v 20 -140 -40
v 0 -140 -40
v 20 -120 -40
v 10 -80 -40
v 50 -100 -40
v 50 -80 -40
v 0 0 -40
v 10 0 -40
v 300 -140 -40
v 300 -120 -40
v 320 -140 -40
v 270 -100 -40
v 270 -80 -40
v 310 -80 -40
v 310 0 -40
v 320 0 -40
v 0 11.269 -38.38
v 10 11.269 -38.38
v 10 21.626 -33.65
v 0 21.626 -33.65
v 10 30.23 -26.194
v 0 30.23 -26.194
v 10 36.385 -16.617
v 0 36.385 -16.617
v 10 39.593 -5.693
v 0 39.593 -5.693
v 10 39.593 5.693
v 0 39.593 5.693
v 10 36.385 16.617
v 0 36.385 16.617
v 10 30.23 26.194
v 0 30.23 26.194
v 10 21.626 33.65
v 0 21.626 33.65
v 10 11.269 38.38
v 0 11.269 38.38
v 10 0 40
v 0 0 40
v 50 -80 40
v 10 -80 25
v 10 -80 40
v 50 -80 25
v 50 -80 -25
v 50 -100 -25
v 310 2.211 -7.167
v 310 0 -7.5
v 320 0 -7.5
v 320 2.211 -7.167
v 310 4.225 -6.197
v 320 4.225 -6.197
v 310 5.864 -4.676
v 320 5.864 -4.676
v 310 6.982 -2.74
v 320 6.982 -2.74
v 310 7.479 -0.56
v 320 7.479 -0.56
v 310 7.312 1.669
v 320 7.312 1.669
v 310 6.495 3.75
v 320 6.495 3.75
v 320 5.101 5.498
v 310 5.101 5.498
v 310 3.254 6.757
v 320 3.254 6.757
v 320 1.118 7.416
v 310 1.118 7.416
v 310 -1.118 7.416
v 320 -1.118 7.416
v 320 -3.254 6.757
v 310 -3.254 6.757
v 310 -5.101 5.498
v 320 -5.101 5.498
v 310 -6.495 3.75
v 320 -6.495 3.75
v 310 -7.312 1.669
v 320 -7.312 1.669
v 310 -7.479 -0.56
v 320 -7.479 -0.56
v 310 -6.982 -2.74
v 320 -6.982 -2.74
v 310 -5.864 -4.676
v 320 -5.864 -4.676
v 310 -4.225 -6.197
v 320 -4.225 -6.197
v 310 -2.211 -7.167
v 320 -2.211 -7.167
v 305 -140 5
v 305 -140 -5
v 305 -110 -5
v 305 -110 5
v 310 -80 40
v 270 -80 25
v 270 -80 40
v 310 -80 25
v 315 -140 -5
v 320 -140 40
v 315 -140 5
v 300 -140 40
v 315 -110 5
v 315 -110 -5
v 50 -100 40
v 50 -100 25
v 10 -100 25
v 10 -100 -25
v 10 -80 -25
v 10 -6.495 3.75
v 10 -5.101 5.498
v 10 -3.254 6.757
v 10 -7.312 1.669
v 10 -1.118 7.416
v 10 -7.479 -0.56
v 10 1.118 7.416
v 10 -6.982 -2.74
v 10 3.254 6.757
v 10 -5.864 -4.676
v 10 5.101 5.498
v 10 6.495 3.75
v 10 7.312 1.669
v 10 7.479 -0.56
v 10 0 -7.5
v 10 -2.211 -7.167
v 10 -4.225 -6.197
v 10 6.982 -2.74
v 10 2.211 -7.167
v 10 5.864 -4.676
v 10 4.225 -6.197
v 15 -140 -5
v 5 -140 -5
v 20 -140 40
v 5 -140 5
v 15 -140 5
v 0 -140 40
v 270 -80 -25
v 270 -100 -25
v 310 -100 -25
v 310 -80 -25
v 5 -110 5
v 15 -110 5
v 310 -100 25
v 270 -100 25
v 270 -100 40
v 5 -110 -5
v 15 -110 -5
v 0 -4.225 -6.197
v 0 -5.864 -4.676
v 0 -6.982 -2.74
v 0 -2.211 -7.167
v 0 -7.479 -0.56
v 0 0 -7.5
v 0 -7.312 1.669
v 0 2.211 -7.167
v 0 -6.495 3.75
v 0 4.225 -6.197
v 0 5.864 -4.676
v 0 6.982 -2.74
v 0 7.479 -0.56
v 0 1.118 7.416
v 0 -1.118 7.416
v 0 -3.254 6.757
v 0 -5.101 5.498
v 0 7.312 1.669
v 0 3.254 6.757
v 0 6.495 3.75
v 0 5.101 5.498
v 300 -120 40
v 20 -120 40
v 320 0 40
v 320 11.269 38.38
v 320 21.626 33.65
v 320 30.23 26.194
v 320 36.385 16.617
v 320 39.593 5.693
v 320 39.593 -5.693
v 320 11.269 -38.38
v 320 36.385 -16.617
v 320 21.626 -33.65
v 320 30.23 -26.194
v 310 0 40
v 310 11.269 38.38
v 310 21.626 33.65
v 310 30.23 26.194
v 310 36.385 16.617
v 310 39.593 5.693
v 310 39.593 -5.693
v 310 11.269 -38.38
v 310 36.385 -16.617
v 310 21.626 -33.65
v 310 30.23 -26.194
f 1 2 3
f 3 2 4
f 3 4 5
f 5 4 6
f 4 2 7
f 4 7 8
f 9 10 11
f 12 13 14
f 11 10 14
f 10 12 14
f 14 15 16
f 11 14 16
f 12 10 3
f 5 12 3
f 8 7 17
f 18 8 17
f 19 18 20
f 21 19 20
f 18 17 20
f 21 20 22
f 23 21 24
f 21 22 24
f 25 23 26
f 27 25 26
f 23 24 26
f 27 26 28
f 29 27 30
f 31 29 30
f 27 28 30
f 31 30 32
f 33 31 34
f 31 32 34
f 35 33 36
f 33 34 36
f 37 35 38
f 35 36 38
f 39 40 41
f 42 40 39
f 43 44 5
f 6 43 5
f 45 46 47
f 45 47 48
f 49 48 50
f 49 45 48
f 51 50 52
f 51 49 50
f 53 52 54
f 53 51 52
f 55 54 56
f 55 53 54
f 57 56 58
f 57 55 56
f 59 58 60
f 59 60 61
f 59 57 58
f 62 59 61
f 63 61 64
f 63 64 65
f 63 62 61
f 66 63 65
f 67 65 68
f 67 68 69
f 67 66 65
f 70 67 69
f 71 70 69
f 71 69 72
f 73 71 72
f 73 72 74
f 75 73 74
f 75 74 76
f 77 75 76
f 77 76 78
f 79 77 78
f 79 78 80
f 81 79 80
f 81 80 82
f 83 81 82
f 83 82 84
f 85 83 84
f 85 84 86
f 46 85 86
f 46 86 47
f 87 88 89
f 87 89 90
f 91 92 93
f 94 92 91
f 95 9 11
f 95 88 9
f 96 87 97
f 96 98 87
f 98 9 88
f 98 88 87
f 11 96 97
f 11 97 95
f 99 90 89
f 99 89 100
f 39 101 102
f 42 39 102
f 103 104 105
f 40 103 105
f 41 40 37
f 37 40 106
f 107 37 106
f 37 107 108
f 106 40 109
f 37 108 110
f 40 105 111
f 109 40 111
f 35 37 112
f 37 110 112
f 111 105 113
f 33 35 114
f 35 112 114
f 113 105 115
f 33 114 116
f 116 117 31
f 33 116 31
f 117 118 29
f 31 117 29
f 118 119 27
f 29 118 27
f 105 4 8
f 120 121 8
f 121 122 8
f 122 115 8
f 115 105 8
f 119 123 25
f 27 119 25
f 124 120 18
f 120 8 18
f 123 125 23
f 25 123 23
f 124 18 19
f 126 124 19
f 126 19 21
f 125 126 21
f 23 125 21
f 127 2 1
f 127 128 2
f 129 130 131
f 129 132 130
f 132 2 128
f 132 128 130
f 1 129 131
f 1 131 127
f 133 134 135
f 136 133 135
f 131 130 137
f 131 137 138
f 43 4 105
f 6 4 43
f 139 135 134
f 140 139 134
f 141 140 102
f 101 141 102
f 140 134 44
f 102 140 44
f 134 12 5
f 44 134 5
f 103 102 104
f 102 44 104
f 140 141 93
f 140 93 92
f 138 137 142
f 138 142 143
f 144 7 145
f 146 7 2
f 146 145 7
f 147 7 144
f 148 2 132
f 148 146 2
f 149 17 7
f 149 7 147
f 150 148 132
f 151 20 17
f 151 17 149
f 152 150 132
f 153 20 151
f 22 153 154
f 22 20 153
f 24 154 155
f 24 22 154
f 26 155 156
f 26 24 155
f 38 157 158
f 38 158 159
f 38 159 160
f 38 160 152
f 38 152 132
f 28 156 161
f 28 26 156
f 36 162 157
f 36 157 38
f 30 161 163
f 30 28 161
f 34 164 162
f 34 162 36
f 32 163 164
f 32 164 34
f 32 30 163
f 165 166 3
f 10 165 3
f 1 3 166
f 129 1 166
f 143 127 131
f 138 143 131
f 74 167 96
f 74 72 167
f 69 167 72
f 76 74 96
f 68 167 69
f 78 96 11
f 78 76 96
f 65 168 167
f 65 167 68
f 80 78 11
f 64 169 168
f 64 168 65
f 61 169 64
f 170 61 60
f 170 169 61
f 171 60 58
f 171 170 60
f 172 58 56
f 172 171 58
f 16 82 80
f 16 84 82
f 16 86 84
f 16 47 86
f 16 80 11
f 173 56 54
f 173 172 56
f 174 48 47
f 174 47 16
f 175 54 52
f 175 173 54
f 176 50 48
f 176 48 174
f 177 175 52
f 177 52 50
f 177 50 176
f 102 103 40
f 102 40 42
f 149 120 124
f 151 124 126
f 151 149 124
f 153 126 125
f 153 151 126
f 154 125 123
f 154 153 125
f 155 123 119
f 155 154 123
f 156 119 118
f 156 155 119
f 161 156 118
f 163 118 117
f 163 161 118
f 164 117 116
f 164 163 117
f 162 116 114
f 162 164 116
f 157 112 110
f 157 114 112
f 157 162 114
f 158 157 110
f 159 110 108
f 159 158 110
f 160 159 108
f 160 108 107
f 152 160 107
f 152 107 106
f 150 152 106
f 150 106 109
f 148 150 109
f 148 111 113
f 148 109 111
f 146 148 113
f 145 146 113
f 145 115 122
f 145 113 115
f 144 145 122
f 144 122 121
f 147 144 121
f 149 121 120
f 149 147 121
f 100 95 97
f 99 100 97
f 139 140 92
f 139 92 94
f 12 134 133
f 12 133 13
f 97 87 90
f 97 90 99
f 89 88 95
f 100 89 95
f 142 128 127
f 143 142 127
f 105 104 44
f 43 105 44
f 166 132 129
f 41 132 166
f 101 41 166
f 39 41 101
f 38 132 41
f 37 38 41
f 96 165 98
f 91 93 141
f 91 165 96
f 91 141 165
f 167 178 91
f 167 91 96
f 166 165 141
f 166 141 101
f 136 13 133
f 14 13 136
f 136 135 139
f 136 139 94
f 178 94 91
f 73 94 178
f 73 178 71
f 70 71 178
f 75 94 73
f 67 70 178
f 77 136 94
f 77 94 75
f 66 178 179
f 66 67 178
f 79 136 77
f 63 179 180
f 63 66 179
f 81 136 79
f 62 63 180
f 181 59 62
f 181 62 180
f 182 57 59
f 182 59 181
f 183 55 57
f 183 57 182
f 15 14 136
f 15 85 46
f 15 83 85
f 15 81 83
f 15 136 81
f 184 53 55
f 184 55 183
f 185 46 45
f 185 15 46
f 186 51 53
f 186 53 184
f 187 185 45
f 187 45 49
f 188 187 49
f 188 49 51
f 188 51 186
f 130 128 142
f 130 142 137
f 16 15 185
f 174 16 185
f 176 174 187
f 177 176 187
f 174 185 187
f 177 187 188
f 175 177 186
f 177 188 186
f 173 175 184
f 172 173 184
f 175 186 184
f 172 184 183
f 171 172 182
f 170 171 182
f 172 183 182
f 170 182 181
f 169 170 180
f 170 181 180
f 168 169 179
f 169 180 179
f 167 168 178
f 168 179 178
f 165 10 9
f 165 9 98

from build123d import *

# Parameters (mm, degrees)
SKETCH_2_R             = 7.5
EXTRUDE_1_DEPTH        = 320
SKETCH_3_W             = 300
SKETCH_3_H             = 140
CUT_EXTRUDE_1_DEPTH    = 351.998575496
SKETCH_4_W             = 20
SKETCH_4_H             = 80
EXTRUDE_2_DEPTH        = 20
SKETCH_5_W             = 10
SKETCH_5_H             = 10
CUT_EXTRUDE_1480_DEPTH = 30
SKETCH_7_W             = 40
SKETCH_7_H             = 15
EXTRUDE_1842_DEPTH     = 20


with BuildPart() as part:
    # 草圖2 → 填料-伸長1 (new body)
    with BuildSketch(Plane(origin=(0, 0, 0), x_dir=(0, 0, -1), z_dir=(1, 0, 0))):
        with BuildLine():
            Line((-40, 0), (-40, -120))
            Line((-40, -120), (40, -120))
            Line((40, -120), (40, 0))
            ThreePointArc((40, 0), (0, 40), (-40, 0))
        make_face()
        Circle(SKETCH_2_R, mode=Mode.SUBTRACT)
    extrude(amount=EXTRUDE_1_DEPTH)

    # 草圖3 → 除料-伸長1 (cut, through all)
    with BuildSketch(Plane(origin=(0, 0, -40), x_dir=(-1, 0, 0), z_dir=(0, 0, -1))):
        with Locations((-160, -30)):
            Rectangle(SKETCH_3_W, SKETCH_3_H)
    extrude(amount=-CUT_EXTRUDE_1_DEPTH, mode=Mode.SUBTRACT)

    # 草圖4 → 填料-伸長2 (add)
    with BuildSketch(Plane.XZ.offset(120)):
        with Locations((10, 0)):
            Rectangle(SKETCH_4_W, SKETCH_4_H)
        with Locations((310, 0)):
            Rectangle(SKETCH_4_W, SKETCH_4_H)
    extrude(amount=EXTRUDE_2_DEPTH)

    # 草圖5 → Cut-Extrude 1480 (cut)
    with BuildSketch(Plane.XZ.offset(140)):
        with Locations((10, 0)):
            Rectangle(SKETCH_5_W, SKETCH_5_H)
        with Locations((310, 0)):
            Rectangle(SKETCH_5_W, SKETCH_5_H)
    extrude(amount=-CUT_EXTRUDE_1480_DEPTH, mode=Mode.SUBTRACT)

    # 草圖7 → Extrude 1842 (add)
    with BuildSketch(Plane(origin=(0, -100, 0), x_dir=(1, 0, 0), z_dir=(0, 1, 0))):
        with Locations((30, 32.5)):
            Rectangle(SKETCH_7_W, SKETCH_7_H)
        with Locations((30, -32.5)):
            Rectangle(SKETCH_7_W, SKETCH_7_H)
        with Locations((290, -32.5)):
            Rectangle(SKETCH_7_W, SKETCH_7_H)
        with Locations((290, 32.5)):
            Rectangle(SKETCH_7_W, SKETCH_7_H)
    extrude(amount=EXTRUDE_1842_DEPTH)


solid = part.part
